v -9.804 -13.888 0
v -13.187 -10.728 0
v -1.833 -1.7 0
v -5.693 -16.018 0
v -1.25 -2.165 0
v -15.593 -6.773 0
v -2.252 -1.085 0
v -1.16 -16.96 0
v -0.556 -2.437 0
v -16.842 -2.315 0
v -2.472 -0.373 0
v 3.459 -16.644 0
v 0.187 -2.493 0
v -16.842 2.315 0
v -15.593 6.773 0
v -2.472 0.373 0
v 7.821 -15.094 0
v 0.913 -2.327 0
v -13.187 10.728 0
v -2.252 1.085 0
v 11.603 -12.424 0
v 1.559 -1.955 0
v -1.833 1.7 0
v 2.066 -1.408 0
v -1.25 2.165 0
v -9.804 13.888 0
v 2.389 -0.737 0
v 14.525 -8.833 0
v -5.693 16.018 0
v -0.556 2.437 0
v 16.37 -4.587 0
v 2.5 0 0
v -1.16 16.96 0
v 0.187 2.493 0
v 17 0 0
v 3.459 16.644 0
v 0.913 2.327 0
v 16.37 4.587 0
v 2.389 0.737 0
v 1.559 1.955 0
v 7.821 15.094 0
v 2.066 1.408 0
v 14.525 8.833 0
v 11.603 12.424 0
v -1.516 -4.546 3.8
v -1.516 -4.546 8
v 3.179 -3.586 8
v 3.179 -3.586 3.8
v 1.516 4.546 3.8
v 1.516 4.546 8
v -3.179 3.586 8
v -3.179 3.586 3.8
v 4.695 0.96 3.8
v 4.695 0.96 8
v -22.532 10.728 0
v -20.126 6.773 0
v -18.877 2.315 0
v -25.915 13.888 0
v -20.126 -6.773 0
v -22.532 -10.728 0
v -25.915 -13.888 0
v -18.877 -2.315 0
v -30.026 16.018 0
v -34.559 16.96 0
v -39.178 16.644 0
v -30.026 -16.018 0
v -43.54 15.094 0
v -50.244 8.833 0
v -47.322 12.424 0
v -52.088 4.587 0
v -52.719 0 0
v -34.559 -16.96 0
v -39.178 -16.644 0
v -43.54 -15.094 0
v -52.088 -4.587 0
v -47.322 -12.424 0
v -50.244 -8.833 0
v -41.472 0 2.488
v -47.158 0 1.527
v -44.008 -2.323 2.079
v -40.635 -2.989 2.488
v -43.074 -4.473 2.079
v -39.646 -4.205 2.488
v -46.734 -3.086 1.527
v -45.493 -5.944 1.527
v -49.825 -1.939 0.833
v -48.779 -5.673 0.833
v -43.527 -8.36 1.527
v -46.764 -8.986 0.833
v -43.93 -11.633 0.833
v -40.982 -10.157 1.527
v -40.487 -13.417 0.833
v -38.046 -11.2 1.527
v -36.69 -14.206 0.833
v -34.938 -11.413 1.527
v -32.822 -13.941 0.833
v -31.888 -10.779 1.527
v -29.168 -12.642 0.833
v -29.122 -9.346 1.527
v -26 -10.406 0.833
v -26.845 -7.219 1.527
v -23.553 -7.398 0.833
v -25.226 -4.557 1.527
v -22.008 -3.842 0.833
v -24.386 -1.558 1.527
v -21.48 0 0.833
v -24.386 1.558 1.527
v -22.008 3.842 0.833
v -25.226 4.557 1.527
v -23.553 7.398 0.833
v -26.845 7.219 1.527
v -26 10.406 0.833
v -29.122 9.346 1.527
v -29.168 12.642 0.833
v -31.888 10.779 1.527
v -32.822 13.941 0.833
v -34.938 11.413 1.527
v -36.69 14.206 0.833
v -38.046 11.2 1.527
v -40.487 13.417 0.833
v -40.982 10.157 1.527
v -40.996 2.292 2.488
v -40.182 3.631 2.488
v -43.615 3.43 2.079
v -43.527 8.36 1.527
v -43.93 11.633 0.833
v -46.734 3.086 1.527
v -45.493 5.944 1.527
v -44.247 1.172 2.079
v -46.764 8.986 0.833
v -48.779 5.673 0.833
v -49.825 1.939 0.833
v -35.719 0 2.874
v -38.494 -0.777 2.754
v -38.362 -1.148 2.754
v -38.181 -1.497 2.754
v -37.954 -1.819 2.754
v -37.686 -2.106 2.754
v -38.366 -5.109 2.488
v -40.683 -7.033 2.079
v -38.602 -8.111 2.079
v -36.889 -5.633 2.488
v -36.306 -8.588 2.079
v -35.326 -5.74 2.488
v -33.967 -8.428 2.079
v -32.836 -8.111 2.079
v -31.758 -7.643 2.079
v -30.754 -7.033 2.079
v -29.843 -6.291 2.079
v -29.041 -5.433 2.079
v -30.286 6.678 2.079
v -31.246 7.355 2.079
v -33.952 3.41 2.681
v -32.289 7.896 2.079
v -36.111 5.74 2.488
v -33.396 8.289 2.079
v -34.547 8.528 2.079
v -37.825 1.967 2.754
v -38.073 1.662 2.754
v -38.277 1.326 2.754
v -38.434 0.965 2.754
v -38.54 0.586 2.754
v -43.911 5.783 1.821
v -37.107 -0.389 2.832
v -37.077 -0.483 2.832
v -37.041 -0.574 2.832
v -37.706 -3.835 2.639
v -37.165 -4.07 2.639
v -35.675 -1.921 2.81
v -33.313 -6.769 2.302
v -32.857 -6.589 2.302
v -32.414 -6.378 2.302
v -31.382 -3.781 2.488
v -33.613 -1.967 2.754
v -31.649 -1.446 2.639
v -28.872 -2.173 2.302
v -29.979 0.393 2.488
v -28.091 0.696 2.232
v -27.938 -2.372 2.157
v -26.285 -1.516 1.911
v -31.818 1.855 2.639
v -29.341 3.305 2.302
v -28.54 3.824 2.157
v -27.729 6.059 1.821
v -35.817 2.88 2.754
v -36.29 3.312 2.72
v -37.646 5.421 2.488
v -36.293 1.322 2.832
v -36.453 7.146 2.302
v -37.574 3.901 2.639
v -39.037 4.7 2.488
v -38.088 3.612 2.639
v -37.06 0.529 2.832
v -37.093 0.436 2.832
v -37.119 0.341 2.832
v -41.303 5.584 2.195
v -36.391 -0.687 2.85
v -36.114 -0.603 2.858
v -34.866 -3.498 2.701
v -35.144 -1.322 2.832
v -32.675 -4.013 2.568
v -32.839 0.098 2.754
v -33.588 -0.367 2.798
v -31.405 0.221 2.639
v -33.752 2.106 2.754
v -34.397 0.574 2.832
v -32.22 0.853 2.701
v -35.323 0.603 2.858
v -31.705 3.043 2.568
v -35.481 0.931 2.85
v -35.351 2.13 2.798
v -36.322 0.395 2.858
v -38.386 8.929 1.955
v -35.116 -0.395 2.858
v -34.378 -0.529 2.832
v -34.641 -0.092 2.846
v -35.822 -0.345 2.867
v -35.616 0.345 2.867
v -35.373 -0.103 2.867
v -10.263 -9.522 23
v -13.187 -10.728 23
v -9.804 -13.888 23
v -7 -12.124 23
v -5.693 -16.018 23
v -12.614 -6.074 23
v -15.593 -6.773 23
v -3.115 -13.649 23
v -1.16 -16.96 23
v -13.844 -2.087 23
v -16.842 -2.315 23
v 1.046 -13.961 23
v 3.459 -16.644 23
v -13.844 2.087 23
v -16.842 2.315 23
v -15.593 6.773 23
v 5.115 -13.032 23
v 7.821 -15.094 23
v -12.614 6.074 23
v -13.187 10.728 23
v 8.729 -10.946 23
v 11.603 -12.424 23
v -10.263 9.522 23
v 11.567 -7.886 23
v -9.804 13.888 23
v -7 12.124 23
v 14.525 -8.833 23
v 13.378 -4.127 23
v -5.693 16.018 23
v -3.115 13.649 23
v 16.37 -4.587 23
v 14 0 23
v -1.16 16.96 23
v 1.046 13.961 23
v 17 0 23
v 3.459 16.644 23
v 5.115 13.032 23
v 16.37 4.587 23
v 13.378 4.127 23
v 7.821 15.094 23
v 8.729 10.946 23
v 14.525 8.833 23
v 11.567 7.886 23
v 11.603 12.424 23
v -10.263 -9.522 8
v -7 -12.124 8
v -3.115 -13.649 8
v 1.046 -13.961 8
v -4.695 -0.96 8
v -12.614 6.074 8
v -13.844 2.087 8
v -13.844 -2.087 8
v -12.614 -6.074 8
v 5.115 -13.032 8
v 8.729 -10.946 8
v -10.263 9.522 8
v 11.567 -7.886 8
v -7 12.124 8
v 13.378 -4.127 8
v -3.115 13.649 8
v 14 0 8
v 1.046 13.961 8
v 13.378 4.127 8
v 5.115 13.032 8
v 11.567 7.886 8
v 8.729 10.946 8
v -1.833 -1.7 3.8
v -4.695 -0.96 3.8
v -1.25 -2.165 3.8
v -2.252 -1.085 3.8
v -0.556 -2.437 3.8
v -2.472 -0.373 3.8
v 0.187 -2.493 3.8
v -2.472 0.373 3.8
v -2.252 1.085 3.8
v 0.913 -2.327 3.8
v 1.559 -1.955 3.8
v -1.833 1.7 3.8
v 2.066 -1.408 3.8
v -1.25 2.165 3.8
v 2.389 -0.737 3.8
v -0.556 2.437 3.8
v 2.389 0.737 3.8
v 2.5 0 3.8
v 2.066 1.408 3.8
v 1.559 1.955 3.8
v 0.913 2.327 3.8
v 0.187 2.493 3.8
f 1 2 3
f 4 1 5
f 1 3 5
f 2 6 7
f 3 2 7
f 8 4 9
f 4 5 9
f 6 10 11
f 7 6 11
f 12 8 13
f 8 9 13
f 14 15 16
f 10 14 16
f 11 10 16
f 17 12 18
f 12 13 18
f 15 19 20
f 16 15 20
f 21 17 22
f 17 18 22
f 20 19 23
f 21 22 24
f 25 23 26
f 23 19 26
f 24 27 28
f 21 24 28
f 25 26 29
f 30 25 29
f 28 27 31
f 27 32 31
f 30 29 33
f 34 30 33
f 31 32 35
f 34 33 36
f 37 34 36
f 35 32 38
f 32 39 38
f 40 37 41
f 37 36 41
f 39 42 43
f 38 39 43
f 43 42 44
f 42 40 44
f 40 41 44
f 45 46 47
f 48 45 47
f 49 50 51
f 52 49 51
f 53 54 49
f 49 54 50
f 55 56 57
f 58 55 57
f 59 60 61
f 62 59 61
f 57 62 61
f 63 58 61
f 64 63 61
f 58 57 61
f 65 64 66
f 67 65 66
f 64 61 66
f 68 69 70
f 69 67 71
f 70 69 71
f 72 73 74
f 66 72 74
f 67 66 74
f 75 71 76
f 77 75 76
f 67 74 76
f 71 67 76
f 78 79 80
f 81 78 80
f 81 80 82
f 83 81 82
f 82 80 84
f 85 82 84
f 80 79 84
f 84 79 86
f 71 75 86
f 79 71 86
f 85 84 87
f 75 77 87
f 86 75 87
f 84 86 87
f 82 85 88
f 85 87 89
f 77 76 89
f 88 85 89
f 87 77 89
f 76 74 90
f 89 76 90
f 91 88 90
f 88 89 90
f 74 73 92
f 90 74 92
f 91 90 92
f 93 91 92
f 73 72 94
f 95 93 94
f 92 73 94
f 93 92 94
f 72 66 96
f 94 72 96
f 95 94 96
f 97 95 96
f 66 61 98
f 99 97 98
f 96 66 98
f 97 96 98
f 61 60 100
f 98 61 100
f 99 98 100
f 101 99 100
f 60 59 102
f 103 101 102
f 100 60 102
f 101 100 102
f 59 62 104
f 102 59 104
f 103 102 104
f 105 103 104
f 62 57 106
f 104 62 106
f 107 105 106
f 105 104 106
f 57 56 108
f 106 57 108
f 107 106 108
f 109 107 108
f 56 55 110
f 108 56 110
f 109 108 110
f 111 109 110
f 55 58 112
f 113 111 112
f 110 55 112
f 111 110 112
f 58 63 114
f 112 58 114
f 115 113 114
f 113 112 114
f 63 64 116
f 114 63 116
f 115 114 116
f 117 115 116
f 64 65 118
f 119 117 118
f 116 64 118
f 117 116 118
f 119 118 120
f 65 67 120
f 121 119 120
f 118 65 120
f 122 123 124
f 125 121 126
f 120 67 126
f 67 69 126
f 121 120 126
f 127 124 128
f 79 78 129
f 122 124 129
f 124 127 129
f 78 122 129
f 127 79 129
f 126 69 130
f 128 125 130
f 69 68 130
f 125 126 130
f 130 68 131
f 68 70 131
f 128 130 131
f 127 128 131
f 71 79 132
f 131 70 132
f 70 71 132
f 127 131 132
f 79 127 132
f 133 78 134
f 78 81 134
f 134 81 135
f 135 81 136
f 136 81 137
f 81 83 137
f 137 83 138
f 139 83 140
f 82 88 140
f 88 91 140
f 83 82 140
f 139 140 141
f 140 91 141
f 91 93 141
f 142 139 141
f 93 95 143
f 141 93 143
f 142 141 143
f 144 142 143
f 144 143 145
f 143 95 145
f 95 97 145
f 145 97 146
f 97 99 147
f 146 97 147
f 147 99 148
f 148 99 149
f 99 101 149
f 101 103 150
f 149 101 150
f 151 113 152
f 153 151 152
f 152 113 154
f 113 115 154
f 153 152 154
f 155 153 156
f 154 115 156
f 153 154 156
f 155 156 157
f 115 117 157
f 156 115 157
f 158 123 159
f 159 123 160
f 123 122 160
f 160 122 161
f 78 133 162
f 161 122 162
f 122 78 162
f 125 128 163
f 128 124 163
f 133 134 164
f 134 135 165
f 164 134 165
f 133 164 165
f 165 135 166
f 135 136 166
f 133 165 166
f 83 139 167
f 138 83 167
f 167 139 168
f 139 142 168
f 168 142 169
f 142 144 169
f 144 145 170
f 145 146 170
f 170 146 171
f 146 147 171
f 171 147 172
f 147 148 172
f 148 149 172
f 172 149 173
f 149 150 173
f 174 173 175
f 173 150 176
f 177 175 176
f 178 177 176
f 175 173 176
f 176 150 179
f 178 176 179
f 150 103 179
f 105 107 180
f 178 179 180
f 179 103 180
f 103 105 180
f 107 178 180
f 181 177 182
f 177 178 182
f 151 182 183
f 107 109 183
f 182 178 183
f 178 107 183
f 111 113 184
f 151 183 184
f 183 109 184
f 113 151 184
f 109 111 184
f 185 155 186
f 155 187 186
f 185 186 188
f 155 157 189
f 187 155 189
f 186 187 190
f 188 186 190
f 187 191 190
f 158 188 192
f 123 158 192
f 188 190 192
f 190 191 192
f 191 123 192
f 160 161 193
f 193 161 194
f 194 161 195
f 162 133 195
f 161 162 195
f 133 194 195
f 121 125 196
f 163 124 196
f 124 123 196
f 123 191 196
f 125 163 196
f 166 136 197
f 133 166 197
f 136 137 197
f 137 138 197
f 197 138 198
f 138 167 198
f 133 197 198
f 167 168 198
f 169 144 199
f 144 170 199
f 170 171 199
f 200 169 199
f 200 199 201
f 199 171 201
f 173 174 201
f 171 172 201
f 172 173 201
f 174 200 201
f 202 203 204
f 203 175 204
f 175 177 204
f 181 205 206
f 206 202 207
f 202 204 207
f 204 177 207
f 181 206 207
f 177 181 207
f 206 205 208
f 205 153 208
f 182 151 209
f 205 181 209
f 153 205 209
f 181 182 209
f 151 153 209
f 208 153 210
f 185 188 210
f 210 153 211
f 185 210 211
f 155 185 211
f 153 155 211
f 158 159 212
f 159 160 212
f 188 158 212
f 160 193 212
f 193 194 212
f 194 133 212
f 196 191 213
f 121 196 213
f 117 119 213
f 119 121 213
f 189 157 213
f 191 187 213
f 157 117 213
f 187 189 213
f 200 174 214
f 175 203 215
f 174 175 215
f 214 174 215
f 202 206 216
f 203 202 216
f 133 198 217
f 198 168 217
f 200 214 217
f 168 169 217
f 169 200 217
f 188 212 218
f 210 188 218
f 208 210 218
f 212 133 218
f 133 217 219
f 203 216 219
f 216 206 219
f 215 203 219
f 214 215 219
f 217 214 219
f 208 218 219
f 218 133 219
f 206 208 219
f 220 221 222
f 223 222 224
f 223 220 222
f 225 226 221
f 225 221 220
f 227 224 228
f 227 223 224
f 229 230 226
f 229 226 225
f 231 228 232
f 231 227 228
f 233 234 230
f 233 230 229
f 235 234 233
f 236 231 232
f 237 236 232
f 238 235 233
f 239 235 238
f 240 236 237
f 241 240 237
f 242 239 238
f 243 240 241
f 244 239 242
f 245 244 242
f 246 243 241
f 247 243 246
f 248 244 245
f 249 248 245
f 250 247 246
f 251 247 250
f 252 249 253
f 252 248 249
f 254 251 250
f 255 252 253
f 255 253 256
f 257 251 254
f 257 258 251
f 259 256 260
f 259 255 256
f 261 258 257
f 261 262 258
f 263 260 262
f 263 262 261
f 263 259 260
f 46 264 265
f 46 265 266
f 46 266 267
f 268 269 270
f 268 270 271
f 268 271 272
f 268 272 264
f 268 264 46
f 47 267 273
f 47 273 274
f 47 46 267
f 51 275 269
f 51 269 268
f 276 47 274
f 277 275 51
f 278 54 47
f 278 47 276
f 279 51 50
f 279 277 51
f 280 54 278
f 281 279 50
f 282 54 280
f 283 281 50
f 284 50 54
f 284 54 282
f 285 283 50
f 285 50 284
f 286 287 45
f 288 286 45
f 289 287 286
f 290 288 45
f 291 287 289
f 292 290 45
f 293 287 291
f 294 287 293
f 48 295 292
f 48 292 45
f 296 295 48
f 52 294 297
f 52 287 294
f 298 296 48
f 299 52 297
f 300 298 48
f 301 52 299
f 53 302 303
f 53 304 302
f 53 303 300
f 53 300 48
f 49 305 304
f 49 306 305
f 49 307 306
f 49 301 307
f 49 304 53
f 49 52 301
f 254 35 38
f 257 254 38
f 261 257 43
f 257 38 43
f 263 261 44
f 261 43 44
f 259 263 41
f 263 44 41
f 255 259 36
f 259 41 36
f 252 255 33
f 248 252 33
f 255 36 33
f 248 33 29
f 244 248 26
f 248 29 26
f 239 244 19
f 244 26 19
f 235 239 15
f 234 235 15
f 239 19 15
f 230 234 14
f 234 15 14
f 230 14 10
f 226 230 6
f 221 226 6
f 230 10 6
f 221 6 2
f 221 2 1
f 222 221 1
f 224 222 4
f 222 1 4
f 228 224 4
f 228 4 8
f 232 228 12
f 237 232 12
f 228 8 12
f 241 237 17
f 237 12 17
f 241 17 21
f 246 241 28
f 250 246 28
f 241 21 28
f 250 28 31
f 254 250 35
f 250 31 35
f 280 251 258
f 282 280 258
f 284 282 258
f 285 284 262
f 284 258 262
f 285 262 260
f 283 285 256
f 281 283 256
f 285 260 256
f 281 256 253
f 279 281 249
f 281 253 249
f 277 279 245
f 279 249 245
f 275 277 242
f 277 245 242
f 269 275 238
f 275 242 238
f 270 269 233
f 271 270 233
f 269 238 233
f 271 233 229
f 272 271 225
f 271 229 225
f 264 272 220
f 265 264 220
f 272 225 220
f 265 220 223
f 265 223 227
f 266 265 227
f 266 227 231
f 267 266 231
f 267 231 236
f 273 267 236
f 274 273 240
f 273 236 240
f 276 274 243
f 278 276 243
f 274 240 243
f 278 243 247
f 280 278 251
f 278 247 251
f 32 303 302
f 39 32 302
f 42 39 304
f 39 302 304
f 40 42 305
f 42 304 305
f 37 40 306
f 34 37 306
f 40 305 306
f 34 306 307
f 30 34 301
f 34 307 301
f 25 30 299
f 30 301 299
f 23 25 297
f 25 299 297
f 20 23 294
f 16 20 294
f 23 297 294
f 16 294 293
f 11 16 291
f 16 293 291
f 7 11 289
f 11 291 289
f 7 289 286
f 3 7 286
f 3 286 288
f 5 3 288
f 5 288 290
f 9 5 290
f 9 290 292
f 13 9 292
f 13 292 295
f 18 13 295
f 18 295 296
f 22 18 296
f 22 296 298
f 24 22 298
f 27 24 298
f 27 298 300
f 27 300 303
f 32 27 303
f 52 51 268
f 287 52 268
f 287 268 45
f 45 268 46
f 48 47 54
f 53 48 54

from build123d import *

# Parameters (mm, degrees)
F0_R     = 17
F1_DEPTH = 23
F2_R     = 14
F3_DEPTH = 15
F5_DEPTH = 4.2
F6_R     = 2.5
F7_DEPTH = 25


with BuildPart() as f1:
    # F0 (on Top) → F1 (new body)
    with BuildSketch(Plane.XY):
        Circle(F0_R)
    extrude(amount=F1_DEPTH)

    # F2 (on face) → F3 (cut)
    with BuildSketch(Plane.XY.offset(23)):
        Circle(F2_R)
    extrude(amount=-F3_DEPTH, mode=Mode.SUBTRACT)

    # F4 (on face) → F5 (cut)
    with BuildSketch(Plane.XY.offset(8)):
        Polygon((3.178705, -3.585968), (4.694892, 0.959855), (1.516187, 4.545823), (-3.178705, 3.585968), (-4.694892, -0.959855), (-1.516187, -4.545823), align=None)
    extrude(amount=-F5_DEPTH, mode=Mode.SUBTRACT)

    # F6 (on face) → F7 (cut)
    with BuildSketch(Plane.XY.offset(3.8)):
        Circle(F6_R)
    extrude(amount=-F7_DEPTH, mode=Mode.SUBTRACT)


with BuildPart() as f9:
    # F8 (on Front) → F9 (revolve)
    with BuildSketch(Plane.XZ):
        with BuildLine():
            Line((-52.718792, 0), (-35.718792, 0))
            Line((-35.718792, 0), (-35.718792, 2.874488))
            ThreePointArc((-35.718792, 2.874488), (-44.327341, 2.079211), (-52.718792, 0))
        make_face()
    revolve(axis=Axis((-35.718792, 0, 9.893033), (0, 0, 1)))


solid = Compound([f1.part, f9.part])
